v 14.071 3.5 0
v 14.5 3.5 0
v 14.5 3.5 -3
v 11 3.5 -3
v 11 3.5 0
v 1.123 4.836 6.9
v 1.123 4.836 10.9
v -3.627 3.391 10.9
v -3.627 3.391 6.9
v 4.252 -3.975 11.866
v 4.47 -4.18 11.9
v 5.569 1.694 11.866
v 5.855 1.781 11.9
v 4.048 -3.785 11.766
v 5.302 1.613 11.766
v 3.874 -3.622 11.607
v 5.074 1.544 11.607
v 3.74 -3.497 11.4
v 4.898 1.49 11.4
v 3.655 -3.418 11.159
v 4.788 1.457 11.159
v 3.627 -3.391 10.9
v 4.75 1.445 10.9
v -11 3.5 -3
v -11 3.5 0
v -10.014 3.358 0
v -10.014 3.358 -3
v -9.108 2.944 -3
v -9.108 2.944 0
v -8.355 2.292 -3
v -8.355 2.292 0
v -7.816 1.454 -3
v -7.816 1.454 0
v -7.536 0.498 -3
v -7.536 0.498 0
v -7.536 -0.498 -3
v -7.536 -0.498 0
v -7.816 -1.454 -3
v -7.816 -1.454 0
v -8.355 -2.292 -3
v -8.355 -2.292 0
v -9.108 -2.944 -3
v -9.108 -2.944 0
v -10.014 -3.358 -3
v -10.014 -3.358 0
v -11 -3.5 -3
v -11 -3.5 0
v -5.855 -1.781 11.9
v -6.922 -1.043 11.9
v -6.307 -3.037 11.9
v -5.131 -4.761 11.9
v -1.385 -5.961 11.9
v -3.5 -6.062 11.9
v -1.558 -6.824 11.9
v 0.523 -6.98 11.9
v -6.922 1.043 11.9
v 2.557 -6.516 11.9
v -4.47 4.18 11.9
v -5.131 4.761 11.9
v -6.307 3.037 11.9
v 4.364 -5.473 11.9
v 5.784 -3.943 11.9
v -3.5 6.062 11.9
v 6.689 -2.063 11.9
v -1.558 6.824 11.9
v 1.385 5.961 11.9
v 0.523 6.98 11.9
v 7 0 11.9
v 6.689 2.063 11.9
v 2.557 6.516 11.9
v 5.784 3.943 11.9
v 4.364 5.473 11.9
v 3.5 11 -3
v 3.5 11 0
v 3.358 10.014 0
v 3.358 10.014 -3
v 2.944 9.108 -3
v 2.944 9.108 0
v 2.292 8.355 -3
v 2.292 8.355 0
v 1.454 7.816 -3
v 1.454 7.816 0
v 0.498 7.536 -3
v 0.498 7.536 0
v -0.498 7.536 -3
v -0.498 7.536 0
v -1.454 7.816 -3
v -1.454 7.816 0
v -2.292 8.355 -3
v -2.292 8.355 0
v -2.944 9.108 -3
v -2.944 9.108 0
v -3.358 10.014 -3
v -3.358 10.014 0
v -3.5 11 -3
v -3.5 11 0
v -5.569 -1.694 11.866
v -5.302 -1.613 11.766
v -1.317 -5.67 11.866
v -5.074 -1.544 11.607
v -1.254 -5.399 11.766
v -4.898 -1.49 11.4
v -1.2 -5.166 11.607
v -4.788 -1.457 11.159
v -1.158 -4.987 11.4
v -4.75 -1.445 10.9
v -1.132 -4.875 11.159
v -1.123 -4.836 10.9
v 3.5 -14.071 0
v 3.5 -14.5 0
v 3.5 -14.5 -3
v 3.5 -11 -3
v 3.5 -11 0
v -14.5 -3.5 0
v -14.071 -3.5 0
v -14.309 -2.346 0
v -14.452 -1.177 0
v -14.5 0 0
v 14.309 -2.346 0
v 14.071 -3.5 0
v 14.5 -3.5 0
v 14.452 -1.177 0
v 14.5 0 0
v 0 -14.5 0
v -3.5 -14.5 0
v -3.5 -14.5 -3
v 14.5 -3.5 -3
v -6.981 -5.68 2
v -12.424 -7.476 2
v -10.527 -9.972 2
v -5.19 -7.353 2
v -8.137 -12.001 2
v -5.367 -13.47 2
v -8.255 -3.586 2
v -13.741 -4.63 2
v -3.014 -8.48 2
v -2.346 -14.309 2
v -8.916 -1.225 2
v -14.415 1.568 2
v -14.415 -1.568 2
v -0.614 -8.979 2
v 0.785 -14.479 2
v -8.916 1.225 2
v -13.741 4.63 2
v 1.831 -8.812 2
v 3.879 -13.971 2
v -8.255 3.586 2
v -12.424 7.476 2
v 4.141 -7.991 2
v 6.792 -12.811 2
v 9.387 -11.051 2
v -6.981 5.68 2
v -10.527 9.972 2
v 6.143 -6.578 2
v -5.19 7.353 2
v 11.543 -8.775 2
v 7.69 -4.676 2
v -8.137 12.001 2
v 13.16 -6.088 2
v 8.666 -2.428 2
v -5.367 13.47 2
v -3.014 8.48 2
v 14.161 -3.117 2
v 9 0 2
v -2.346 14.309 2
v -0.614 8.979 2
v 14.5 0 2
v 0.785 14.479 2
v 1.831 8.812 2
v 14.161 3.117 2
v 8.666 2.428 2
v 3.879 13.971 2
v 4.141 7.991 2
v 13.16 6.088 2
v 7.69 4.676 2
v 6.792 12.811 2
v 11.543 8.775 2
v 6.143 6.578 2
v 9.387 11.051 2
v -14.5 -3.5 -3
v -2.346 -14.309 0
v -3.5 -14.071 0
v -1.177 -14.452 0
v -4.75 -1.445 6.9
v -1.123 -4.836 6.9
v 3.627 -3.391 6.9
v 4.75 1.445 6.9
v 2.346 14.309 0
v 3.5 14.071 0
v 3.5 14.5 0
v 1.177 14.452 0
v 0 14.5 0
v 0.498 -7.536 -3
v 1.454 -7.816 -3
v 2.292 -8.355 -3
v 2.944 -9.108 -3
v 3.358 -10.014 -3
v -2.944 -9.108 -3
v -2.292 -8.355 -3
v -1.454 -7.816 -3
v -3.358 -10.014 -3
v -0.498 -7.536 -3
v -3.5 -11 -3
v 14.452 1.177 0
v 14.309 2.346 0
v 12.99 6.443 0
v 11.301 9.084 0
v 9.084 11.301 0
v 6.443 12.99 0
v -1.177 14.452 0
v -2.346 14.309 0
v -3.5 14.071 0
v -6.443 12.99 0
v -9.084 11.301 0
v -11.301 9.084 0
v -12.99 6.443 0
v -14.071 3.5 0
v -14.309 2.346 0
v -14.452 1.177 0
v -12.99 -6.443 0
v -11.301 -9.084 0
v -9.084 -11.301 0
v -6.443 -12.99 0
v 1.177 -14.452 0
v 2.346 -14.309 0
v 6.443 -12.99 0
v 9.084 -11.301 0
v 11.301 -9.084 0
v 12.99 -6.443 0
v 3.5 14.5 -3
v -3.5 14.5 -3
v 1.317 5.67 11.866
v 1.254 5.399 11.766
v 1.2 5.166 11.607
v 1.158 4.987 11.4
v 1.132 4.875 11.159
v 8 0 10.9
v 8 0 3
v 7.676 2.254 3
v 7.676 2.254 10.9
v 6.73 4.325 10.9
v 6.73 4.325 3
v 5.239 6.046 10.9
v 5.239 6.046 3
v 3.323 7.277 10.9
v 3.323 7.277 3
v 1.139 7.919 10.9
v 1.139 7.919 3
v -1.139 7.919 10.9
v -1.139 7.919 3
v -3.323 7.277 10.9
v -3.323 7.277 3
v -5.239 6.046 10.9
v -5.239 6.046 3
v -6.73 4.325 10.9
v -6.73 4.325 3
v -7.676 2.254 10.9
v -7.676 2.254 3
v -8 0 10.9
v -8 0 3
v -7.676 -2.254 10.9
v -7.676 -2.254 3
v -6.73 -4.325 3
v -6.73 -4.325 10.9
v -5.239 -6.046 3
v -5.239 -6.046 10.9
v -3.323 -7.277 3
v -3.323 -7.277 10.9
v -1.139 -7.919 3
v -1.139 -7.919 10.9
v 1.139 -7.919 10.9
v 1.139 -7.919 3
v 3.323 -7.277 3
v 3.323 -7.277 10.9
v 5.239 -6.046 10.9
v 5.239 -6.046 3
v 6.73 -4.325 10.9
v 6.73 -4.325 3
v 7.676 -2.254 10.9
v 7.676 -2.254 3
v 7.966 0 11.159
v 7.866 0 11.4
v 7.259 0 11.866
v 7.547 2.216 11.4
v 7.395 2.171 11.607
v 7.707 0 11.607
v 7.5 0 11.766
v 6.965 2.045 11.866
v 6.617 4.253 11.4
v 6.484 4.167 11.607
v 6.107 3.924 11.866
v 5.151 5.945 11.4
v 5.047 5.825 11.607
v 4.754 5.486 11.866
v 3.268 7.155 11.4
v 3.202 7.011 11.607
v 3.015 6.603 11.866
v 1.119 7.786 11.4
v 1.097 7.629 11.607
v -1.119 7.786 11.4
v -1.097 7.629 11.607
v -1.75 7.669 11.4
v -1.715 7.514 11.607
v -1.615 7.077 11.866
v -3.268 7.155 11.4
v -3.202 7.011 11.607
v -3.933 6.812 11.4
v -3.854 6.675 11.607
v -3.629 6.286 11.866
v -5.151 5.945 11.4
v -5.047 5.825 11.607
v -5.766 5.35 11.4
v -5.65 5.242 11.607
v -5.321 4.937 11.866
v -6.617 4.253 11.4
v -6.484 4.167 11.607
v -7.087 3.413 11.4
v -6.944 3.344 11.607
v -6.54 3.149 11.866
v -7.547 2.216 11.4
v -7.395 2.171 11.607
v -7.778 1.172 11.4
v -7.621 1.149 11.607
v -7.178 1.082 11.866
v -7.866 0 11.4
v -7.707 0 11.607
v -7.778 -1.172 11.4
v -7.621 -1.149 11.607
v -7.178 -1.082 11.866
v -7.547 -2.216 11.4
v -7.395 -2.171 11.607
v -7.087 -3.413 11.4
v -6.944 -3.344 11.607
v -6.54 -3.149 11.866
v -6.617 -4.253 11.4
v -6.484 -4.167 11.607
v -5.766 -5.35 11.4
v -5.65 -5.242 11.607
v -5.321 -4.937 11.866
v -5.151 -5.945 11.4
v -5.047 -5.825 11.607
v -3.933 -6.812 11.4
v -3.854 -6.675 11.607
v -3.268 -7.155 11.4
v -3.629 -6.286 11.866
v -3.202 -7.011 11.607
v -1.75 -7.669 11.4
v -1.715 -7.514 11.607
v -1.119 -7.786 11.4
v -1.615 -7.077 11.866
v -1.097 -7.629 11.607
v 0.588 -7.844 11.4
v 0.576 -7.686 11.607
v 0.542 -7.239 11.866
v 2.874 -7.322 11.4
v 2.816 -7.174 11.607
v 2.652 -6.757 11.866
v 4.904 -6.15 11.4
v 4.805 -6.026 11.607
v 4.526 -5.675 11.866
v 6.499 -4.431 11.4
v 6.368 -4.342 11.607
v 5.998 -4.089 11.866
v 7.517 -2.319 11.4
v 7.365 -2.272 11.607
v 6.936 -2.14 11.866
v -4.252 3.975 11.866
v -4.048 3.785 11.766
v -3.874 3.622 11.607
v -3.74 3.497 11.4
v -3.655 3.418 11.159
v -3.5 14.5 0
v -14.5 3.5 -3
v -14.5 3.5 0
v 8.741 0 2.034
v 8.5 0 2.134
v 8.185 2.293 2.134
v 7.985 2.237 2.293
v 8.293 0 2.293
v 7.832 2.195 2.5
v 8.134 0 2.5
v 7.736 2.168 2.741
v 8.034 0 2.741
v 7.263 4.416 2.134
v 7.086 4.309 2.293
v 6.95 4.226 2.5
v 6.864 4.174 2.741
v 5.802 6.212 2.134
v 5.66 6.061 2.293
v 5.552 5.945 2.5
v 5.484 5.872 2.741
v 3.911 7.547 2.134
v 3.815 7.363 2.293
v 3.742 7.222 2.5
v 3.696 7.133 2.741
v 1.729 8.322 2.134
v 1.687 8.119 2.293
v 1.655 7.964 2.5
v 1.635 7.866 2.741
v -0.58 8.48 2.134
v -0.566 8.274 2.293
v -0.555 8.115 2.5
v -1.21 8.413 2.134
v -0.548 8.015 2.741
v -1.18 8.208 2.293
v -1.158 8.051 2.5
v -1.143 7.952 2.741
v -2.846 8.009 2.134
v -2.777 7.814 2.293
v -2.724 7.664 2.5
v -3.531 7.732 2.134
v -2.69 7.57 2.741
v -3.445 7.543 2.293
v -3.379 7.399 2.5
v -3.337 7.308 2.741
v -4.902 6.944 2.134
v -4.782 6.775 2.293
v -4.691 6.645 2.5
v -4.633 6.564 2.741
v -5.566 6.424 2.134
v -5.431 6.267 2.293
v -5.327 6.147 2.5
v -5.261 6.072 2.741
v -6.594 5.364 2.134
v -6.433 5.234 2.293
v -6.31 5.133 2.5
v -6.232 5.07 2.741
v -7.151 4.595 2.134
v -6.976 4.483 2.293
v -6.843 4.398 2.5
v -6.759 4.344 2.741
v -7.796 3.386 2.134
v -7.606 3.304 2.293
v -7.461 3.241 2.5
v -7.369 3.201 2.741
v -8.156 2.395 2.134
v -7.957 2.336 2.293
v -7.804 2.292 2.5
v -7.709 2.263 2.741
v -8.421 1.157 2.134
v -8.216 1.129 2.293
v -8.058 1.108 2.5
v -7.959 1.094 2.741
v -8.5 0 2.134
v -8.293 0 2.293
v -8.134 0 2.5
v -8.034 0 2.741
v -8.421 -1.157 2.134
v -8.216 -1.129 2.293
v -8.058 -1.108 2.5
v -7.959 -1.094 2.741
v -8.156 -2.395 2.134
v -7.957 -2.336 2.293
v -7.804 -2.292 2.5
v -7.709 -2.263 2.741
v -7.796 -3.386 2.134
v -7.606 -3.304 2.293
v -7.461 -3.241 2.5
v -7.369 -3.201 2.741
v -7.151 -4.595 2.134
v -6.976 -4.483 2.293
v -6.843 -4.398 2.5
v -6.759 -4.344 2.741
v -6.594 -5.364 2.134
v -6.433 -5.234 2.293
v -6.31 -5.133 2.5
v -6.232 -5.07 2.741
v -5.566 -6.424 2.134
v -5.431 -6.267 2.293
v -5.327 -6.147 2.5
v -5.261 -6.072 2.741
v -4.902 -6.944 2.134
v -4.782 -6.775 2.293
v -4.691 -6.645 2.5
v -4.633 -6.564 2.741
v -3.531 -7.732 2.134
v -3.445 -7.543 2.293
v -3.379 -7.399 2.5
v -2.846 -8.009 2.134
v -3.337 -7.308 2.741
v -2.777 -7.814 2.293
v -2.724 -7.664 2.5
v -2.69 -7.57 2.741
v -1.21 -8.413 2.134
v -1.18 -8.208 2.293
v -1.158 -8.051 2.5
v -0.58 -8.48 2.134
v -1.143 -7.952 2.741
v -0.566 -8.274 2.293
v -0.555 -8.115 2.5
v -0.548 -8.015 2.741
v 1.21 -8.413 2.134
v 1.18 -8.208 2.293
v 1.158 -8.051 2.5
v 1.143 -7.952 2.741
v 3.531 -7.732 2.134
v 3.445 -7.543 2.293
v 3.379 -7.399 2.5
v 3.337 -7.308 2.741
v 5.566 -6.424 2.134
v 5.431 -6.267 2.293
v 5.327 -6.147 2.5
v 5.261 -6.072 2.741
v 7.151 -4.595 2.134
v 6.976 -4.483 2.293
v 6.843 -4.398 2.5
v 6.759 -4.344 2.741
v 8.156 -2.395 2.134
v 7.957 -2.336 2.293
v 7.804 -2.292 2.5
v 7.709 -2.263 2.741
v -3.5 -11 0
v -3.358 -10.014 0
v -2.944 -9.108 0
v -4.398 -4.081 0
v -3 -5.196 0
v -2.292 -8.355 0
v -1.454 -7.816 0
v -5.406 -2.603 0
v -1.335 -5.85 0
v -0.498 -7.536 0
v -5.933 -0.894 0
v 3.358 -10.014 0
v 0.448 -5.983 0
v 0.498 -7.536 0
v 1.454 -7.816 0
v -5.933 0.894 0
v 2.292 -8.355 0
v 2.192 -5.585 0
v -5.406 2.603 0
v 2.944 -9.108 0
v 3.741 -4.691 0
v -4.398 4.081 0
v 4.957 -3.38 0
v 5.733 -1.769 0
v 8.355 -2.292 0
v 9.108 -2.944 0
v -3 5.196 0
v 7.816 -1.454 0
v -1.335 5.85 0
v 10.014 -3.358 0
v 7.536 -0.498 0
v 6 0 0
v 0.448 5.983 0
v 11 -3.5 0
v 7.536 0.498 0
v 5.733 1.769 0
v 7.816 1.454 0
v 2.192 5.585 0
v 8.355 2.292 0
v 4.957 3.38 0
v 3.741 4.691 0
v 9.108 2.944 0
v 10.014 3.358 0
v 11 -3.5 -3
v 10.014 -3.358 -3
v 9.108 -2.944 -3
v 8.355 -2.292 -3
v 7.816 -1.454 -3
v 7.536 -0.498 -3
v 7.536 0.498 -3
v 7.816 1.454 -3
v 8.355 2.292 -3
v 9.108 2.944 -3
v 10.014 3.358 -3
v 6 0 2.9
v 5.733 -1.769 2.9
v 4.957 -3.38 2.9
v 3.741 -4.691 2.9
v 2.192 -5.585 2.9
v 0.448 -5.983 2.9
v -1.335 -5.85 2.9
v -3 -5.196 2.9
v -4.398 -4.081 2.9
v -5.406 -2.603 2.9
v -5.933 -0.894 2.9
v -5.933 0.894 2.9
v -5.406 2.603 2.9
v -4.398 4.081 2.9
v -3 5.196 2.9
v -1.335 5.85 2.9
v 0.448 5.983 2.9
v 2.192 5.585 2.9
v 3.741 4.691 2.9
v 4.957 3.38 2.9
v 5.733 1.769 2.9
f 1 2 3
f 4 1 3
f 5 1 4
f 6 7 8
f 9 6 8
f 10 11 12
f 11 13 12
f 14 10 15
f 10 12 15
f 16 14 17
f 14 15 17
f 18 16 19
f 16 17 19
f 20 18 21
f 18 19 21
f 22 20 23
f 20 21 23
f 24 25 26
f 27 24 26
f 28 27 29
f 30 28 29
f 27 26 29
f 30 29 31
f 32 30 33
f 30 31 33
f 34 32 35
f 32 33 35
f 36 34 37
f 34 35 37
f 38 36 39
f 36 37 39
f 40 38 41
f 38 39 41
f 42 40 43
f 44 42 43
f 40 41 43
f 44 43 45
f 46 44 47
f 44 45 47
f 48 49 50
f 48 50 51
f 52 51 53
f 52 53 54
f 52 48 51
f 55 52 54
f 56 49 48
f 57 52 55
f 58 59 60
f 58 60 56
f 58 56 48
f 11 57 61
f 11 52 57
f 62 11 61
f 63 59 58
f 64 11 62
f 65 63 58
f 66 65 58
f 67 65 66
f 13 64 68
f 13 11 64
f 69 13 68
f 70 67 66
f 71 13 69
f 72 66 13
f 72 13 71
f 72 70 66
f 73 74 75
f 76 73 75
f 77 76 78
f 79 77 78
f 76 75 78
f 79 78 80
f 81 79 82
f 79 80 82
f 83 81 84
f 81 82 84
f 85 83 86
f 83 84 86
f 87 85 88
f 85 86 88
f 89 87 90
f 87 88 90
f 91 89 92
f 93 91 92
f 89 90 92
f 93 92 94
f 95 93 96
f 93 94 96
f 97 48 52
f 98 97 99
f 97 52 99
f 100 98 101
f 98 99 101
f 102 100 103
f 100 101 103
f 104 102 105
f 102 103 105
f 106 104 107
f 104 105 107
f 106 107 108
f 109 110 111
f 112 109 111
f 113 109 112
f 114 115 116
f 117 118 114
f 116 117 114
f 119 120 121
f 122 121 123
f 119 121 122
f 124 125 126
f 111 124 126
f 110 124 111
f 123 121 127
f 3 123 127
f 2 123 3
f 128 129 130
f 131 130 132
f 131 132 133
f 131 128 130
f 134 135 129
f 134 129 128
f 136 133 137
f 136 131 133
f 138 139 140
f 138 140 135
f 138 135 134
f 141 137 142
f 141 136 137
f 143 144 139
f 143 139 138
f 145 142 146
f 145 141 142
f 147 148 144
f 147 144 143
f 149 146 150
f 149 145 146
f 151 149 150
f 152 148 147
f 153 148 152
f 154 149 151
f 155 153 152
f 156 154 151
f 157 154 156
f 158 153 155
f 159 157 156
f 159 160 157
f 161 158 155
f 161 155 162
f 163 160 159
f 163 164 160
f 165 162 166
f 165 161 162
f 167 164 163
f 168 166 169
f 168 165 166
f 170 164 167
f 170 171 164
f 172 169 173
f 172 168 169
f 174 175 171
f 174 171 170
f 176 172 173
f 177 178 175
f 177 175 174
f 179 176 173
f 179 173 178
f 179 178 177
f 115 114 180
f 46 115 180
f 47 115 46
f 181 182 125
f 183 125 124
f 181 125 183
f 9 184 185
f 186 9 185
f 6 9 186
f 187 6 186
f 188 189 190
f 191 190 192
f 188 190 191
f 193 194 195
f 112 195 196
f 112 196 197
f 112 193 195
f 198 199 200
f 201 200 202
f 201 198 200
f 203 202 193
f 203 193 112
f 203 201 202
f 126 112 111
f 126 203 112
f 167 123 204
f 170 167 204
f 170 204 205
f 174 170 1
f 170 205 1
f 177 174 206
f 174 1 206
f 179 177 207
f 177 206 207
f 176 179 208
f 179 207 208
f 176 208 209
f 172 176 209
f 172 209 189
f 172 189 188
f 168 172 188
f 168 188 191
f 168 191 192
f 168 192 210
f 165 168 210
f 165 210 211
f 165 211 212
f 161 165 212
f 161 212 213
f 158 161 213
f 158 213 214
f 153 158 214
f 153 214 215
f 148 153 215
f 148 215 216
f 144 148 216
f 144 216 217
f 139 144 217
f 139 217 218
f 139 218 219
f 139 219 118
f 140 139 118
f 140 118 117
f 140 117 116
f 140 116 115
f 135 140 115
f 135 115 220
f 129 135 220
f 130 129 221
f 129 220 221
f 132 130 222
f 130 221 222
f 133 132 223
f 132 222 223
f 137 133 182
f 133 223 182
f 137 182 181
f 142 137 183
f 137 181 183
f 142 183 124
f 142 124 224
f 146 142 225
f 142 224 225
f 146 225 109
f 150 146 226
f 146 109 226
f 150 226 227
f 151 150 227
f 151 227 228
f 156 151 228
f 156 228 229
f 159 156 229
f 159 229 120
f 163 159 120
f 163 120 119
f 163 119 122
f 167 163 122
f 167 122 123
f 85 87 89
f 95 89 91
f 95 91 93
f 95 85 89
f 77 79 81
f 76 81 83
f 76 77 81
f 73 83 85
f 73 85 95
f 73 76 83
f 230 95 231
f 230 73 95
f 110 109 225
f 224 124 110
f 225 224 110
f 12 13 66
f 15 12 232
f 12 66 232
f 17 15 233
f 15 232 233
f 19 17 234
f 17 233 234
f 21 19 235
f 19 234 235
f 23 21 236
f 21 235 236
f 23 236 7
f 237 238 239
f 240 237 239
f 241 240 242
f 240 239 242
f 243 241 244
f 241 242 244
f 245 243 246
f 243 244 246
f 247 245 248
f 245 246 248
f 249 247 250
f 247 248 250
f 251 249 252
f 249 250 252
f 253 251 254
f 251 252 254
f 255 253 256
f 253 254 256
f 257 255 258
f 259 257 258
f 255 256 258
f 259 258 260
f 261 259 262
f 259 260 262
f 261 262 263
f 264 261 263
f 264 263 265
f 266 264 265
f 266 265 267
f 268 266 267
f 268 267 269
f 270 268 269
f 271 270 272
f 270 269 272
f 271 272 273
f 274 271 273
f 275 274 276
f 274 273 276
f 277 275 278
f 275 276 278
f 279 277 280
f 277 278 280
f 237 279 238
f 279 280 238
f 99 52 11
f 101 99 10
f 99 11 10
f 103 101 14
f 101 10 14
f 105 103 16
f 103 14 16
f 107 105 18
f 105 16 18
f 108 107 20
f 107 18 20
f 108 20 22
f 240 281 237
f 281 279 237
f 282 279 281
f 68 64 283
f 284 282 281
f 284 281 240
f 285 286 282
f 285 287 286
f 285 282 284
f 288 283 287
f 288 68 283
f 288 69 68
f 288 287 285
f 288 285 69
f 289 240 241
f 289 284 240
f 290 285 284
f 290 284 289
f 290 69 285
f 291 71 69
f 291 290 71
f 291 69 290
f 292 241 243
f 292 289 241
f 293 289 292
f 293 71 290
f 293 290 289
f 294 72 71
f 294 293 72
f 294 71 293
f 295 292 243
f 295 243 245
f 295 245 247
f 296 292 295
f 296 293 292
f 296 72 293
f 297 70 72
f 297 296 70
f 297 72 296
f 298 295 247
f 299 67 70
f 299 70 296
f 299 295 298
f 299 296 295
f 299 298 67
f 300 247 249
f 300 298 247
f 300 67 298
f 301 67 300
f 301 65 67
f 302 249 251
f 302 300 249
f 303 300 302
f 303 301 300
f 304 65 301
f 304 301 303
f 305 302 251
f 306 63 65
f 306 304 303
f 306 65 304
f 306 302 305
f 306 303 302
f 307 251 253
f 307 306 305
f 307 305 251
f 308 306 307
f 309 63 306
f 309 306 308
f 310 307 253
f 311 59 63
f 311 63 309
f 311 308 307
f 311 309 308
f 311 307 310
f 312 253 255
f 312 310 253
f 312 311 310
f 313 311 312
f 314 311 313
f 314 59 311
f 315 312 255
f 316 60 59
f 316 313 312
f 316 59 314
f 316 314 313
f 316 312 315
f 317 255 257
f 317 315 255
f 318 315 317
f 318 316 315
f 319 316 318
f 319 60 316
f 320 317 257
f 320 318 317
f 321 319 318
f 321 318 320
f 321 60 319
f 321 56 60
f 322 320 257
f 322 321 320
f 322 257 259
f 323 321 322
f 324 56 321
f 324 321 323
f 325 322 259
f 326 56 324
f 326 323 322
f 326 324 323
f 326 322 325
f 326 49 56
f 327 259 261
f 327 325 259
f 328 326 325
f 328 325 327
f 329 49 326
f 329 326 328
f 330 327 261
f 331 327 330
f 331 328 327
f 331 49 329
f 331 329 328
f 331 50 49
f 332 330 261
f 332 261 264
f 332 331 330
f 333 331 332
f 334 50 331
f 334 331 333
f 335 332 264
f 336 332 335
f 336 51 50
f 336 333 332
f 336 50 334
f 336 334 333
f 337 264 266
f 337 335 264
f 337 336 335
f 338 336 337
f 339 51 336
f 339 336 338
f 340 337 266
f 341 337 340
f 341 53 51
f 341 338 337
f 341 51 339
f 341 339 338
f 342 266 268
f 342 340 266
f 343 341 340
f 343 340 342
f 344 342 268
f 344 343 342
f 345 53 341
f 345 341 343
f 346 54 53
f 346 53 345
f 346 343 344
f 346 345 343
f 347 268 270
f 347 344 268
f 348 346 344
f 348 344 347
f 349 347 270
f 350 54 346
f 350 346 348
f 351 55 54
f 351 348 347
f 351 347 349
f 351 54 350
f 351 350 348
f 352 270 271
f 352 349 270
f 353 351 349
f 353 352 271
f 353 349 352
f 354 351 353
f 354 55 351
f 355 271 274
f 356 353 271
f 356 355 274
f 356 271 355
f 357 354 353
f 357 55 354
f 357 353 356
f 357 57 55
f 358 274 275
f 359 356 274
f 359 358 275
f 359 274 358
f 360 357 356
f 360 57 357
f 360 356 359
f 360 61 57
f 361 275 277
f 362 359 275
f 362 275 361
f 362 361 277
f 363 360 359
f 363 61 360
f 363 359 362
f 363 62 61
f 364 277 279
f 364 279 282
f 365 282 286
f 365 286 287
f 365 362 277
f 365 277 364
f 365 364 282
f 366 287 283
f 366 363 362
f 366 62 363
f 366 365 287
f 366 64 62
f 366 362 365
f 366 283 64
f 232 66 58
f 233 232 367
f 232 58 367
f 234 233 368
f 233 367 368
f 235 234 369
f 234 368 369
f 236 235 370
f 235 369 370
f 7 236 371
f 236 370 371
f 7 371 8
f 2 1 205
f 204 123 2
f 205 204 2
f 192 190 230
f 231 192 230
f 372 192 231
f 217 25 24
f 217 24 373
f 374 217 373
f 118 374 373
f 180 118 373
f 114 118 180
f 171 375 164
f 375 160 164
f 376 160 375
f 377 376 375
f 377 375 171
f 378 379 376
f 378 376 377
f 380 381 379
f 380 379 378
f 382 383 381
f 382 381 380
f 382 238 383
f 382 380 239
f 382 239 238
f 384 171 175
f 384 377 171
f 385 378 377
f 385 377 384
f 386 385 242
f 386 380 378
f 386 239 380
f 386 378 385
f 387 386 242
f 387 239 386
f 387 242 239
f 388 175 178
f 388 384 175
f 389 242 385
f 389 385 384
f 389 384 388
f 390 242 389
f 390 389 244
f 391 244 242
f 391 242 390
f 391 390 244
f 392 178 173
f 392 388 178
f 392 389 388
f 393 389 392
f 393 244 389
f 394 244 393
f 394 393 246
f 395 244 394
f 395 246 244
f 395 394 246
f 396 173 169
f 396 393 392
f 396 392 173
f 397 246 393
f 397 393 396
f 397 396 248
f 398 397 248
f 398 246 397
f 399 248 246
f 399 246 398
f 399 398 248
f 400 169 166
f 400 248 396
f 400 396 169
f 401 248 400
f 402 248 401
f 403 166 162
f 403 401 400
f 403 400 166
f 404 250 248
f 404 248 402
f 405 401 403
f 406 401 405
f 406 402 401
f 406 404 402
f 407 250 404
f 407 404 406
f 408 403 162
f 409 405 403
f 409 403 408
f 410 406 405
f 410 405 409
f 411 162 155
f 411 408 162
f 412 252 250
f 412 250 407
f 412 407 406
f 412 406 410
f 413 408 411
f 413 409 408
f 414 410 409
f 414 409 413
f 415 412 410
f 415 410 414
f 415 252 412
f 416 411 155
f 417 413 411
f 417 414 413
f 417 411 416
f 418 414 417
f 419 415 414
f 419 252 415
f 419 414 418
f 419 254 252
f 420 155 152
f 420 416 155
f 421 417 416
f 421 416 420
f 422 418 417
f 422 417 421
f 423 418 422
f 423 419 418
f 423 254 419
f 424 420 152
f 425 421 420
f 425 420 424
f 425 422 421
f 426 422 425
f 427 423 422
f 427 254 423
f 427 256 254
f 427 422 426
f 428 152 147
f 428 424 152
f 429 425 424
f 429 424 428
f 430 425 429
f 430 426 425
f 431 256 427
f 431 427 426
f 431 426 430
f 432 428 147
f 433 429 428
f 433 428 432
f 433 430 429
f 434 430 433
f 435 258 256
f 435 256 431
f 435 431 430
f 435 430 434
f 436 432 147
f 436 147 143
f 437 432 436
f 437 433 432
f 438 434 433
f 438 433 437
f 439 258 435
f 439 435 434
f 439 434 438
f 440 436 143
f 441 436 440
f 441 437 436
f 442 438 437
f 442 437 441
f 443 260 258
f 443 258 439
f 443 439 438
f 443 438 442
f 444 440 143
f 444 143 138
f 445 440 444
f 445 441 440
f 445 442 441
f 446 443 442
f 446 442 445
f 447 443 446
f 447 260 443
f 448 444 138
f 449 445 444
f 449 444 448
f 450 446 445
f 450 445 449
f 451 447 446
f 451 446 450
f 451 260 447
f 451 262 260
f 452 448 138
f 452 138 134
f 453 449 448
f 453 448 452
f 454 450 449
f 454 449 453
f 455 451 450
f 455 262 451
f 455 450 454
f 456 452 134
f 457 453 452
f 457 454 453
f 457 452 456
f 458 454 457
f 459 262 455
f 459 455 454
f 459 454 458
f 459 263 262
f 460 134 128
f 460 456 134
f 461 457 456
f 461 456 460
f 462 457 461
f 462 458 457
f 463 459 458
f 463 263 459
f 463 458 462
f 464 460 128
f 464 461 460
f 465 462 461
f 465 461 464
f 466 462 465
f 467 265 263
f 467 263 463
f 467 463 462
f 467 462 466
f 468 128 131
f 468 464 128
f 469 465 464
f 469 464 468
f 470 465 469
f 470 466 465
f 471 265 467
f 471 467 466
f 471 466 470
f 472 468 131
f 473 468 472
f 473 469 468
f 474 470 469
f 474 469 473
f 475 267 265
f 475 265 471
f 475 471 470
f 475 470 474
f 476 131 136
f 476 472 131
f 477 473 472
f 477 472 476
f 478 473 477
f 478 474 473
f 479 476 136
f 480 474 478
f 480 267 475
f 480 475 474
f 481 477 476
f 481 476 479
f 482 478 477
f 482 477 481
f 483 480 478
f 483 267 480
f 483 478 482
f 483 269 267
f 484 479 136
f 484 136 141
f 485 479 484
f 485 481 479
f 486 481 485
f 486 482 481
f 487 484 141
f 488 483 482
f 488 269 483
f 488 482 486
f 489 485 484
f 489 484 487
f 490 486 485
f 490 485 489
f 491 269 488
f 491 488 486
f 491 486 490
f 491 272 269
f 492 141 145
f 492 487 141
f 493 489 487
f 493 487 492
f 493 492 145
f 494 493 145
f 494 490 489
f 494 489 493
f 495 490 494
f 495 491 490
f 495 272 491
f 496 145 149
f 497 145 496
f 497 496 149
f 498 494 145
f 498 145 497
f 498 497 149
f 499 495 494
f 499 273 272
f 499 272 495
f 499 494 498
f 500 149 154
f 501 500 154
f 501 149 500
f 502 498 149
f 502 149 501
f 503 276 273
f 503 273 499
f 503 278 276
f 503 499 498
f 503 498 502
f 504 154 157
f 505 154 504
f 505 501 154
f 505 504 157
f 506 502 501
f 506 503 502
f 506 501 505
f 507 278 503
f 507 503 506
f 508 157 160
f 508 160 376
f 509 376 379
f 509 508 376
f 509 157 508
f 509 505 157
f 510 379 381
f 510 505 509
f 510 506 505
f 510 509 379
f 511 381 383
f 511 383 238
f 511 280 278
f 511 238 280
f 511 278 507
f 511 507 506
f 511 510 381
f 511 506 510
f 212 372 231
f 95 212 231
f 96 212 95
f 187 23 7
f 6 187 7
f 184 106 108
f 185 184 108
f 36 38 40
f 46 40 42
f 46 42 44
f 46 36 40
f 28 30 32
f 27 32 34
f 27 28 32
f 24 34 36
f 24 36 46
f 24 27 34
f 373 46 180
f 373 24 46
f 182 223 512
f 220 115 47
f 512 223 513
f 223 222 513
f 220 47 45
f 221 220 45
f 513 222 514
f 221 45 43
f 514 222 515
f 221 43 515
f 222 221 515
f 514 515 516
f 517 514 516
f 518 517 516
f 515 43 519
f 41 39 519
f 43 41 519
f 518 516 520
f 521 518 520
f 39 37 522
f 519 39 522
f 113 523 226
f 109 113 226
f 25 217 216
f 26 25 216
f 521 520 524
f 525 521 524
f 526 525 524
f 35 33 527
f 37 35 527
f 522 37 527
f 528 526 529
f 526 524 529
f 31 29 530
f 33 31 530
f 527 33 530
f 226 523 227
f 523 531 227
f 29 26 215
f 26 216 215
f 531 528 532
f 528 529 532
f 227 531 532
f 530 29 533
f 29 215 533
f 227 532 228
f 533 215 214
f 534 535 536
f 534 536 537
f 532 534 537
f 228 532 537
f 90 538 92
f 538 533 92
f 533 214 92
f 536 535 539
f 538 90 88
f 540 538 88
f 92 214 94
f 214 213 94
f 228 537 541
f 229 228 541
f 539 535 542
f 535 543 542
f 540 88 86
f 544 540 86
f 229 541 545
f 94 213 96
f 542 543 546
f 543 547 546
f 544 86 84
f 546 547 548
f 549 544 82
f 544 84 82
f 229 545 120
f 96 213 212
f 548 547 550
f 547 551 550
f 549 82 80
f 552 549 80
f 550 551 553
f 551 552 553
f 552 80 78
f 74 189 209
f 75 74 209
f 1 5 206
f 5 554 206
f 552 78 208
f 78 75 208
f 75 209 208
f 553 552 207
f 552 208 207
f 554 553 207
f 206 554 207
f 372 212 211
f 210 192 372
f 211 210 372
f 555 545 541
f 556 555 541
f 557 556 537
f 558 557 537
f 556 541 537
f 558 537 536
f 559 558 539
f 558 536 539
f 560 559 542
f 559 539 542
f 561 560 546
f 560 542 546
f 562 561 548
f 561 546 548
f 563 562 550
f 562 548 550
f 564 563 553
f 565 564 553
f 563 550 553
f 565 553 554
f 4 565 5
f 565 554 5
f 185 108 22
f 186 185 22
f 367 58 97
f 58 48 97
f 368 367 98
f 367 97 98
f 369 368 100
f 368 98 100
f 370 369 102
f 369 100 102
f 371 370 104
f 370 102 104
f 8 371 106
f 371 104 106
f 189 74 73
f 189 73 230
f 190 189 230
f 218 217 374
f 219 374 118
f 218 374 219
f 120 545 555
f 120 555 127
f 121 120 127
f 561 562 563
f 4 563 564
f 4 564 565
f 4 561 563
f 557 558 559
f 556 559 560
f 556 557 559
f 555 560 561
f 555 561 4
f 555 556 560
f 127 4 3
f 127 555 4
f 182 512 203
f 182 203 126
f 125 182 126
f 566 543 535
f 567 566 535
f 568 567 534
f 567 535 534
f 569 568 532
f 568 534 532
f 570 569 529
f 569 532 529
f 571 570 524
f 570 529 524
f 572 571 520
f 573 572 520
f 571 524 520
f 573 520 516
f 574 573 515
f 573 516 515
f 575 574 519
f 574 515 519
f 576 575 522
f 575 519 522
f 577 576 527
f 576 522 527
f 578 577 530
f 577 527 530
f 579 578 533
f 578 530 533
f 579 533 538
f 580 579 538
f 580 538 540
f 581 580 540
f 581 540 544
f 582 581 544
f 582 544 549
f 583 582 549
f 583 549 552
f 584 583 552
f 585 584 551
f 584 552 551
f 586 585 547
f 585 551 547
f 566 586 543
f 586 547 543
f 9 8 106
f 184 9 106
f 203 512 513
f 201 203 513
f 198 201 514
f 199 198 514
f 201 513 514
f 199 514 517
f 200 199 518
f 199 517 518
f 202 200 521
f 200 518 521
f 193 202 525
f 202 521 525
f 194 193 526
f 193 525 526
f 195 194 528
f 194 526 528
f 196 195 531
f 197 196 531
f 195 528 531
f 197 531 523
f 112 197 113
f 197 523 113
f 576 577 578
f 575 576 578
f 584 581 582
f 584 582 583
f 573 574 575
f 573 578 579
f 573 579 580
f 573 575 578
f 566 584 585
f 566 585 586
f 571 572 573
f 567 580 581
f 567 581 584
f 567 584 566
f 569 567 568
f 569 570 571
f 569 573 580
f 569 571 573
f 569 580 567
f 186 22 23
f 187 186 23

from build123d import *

# Parameters (mm, degrees)
SKETCH_R           = 14.5
PAD_DEPTH          = 2
SKETCH001_R        = 8
PAD001_DEPTH       = 9.9
POCKET_DEPTH       = 5
PAD002_DEPTH       = 3
POLARPATTERN_COUNT = 4
SKETCH004_R        = 6
POCKET001_DEPTH    = 2.9
FILLET_R           = 1
FILLET001_R        = 1
FILLET002_R        = 1


with BuildPart() as part:
    # Sketch → Pad (new body)
    with BuildSketch(Plane.XY):
        Circle(SKETCH_R)
    extrude(amount=PAD_DEPTH)

    # Sketch001 (on Face3 of Pad) → Pad001 (join)
    with BuildSketch(Plane.XY.offset(2)):
        Circle(SKETCH001_R)
    extrude(amount=PAD001_DEPTH)

    # Sketch002 (on Face5 of Pad001) → Pocket (cut)
    with BuildSketch(Plane.XY.offset(11.9)):
        Polygon((3.626666, -3.390946), (4.749979, 1.445312), (1.123312, 4.836258), (-3.626666, 3.390946), (-4.749979, -1.445312), (-1.123312, -4.836258), align=None)
    extrude(amount=-POCKET_DEPTH, mode=Mode.SUBTRACT)

    # Sketch003 (on Face2 of Pocket) → Pad002 (join)
    with BuildSketch(Plane(origin=(0, 0, 0), x_dir=(1, 0, 0), z_dir=(0, 0, -1))):
        with BuildLine():
            ThreePointArc((11, 3.5), (7.5, 0), (11, -3.5))
            Line((14.5, -3.5), (11, -3.5))
            Line((14.5, 3.5), (14.5, -3.5))
            Line((11, 3.5), (14.5, 3.5))
        make_face()
    pad002 = extrude(amount=PAD002_DEPTH)

    # PolarPattern: Pad002 ×4 about axis
    polarpattern_axis = Axis((0, 0, 0), (0, 0, -1))
    for i in range(1, POLARPATTERN_COUNT):
        add(pad002.rotate(polarpattern_axis, i * 360 / POLARPATTERN_COUNT))

    # Sketch004 (on Face4 of PolarPattern) → Pocket001 (cut)
    with BuildSketch(Plane(origin=(0, 0, 0), x_dir=(1, 0, 0), z_dir=(0, 0, -1))):
        Circle(SKETCH004_R)
    extrude(amount=-POCKET001_DEPTH, mode=Mode.SUBTRACT)

    # Fillet
    fillet_edges = [part.edges().sort_by_distance(p)[0] for p in [
        (-8, 0, 2),
    ]]
    fillet(fillet_edges, radius=FILLET_R)

    # Fillet001
    fillet001_edges = [part.edges().sort_by_distance(p)[0] for p in [
        (-8, 0, 11.9),
    ]]
    fillet(fillet001_edges, radius=FILLET001_R)

    # Fillet002
    fillet002_edges = [part.edges().sort_by_distance(p)[0] for p in [
        (4.188323, -0.972817, 11.9),
        (1.251677, -4.113602, 11.9),
        (-2.936646, -3.140785, 11.9),
        (-4.188323, 0.972817, 11.9),
        (-1.251677, 4.113602, 11.9),
        (2.936646, 3.140785, 11.9),
    ]]
    fillet(fillet002_edges, radius=FILLET002_R)


solid = part.part
